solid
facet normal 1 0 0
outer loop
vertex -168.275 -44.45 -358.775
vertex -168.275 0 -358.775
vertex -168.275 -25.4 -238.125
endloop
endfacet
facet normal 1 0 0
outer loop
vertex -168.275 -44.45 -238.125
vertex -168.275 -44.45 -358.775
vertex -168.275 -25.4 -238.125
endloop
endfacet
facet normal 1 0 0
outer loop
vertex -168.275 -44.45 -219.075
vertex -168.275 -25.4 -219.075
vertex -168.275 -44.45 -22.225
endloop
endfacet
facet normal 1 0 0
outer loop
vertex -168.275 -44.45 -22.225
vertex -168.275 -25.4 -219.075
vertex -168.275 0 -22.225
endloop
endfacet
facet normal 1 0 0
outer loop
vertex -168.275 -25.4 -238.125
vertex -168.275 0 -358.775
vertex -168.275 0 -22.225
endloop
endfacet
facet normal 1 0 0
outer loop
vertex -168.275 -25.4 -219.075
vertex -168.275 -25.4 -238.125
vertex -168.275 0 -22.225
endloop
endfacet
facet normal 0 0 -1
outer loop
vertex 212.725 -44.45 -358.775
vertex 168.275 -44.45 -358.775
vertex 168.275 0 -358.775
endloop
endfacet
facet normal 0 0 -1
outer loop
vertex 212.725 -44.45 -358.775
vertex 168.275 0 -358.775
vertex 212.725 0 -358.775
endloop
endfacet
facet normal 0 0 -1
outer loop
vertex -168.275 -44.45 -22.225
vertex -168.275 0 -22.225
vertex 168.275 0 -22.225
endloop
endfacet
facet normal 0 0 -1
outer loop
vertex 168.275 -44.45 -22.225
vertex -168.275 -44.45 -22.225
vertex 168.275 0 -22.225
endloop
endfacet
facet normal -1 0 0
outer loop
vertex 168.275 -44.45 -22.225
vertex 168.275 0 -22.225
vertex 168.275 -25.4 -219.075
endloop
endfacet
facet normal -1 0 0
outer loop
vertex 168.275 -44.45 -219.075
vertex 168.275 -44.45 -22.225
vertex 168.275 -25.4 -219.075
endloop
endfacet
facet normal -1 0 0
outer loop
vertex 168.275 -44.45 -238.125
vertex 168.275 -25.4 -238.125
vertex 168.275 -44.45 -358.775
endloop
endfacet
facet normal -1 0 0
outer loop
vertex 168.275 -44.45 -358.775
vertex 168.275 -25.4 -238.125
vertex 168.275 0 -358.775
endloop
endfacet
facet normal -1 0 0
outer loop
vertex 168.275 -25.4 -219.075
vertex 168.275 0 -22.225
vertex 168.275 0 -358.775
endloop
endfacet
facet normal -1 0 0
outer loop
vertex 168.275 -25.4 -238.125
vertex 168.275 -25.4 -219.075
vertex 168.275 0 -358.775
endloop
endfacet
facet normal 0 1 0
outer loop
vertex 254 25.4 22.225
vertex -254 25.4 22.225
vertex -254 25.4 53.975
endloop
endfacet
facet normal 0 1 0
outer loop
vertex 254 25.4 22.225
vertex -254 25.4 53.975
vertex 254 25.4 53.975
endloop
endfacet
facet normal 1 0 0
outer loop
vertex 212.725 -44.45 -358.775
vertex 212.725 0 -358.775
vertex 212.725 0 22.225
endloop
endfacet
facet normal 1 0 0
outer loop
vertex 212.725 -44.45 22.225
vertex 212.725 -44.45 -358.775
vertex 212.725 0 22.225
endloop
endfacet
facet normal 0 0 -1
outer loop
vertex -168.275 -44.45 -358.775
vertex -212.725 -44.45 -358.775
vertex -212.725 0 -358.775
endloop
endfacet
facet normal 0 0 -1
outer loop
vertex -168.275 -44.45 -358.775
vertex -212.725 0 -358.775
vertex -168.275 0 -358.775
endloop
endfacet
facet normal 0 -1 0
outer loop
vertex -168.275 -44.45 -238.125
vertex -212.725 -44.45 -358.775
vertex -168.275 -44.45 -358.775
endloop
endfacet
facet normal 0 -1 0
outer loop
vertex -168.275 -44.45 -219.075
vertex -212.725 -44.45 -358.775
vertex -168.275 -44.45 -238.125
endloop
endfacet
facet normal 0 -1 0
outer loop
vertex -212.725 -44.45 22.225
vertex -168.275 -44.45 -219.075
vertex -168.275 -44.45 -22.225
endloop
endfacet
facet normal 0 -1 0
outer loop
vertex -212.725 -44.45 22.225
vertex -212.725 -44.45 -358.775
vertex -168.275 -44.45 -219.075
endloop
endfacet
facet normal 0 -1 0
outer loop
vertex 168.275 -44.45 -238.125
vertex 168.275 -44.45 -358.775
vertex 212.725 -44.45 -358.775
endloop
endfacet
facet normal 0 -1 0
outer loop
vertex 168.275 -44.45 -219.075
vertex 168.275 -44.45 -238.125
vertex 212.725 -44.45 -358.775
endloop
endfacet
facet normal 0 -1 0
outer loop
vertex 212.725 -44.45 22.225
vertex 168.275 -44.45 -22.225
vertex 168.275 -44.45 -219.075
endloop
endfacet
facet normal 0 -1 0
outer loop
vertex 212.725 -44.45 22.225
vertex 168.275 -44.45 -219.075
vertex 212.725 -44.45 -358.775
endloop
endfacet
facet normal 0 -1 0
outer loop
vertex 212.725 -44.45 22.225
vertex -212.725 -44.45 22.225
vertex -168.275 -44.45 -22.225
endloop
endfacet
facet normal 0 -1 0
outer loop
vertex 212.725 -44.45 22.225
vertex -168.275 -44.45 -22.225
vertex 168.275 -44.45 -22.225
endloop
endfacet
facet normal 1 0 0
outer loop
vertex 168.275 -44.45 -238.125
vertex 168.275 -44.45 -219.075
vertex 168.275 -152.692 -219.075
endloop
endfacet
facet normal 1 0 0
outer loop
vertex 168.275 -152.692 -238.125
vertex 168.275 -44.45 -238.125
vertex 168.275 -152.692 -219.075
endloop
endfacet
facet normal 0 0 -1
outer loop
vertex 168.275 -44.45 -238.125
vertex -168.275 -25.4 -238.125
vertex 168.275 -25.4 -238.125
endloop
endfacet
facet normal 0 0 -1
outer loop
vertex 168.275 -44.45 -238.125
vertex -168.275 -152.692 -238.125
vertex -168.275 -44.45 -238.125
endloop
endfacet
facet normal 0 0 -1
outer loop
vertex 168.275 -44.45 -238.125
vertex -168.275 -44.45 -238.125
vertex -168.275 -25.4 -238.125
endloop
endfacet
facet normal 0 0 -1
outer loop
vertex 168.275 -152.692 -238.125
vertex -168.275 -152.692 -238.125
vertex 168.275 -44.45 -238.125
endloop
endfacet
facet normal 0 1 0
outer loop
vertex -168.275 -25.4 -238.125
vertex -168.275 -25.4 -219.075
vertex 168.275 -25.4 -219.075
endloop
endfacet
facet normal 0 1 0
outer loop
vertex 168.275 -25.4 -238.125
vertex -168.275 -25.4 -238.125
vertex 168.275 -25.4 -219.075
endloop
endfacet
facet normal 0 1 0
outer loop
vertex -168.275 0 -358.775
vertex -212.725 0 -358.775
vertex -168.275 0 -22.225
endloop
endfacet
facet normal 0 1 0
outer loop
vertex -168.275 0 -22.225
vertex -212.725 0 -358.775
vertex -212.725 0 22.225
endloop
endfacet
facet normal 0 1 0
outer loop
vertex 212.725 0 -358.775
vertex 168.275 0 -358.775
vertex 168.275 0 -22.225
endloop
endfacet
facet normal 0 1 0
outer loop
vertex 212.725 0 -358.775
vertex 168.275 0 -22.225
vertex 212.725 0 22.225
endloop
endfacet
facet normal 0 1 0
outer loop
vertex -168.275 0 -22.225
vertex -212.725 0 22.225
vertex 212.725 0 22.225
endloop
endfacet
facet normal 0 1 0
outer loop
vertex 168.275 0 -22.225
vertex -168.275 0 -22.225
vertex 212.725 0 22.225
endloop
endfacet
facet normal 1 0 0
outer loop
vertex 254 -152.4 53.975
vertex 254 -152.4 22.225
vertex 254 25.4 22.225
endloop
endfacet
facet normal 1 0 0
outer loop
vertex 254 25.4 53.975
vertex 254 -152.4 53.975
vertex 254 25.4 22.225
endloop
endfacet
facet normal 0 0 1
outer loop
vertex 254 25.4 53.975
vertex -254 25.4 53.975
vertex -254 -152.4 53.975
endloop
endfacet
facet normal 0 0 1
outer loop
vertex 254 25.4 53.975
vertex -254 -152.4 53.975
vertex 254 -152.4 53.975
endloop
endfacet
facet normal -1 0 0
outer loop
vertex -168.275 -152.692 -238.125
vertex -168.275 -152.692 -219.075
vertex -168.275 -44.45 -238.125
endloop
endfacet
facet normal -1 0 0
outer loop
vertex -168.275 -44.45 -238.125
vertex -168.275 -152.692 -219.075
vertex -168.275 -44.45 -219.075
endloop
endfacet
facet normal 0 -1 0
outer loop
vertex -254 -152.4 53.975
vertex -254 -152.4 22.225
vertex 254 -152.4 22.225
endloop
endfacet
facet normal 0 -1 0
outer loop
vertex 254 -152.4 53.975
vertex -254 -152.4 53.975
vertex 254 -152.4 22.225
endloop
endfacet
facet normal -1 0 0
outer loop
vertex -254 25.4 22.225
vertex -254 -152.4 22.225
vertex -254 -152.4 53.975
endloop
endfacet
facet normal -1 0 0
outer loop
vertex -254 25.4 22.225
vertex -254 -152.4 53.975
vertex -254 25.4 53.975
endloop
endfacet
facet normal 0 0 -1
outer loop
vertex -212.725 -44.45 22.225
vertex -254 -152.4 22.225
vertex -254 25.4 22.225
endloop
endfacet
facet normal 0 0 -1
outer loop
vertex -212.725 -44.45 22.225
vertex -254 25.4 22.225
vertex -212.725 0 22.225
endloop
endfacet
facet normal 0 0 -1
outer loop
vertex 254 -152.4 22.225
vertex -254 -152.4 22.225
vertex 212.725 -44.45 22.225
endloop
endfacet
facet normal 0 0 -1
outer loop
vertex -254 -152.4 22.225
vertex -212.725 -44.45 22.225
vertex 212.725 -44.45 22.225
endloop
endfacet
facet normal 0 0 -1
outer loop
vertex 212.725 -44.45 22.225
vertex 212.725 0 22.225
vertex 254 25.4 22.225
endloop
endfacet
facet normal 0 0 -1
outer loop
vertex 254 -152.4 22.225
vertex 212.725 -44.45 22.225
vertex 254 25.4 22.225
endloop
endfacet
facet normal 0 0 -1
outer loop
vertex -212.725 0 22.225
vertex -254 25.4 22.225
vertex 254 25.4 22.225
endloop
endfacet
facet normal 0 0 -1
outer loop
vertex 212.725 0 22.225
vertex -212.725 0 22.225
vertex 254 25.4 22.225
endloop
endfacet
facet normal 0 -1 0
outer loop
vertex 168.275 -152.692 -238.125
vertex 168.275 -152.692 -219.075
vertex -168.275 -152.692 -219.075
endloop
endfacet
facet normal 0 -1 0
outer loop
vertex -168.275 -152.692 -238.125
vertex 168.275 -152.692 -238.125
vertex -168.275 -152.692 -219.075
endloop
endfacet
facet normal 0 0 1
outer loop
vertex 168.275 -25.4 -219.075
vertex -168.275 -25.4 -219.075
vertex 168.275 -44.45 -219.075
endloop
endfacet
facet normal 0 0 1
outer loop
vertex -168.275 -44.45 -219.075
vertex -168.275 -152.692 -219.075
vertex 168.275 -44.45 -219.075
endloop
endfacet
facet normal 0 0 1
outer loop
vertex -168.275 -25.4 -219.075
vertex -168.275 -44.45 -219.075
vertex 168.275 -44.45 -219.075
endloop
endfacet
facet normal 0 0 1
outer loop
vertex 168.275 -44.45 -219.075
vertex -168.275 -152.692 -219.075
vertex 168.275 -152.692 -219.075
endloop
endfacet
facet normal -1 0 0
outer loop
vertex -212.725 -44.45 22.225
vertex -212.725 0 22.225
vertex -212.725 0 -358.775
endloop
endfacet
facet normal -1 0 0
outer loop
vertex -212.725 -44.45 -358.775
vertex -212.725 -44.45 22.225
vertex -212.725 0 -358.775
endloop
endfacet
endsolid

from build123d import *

# Parameters (mm, degrees)
F0_W     = 336.55
F0_H     = 44.45
F1_DEPTH = 44.45
F2_W     = 508
F2_H     = 177.8
F3_DEPTH = 31.75
F6_DEPTH = 19.05


with BuildPart() as f1:
    # F0 (on Front) → F1 (new body)
    with BuildSketch(Plane.XZ):
        Rectangle(F0_W, F0_H)
        Polygon((-168.275, -22.225), (-168.275, 22.225), (-212.725, 22.225), (-212.725, -358.775), (-168.275, -358.775), align=None)
        Polygon((212.725, 22.225), (168.275, 22.225), (168.275, -22.225), (168.275, -358.775), (212.725, -358.775), align=None)
    extrude(amount=F1_DEPTH)

    # F2 (on face) → F3 (join)
    with BuildSketch(Plane.XY.offset(22.225)):
        with Locations((0, -63.5)):
            Rectangle(F2_W, F2_H)
    extrude(amount=F3_DEPTH)

    # F5 (on offset) → F6 (join)
    with BuildSketch(Plane(origin=(0, 0, -219.075), x_dir=(1, 0, 0), z_dir=(0, 0, -1))):
        Polygon((-168.275, 44.45), (-168.275, 25.4), (168.275, 25.4), (168.275, 44.45), (168.275, 152.6916772127), (-168.275, 152.6916772127), align=None)
    extrude(amount=F6_DEPTH)


solid = f1.part
